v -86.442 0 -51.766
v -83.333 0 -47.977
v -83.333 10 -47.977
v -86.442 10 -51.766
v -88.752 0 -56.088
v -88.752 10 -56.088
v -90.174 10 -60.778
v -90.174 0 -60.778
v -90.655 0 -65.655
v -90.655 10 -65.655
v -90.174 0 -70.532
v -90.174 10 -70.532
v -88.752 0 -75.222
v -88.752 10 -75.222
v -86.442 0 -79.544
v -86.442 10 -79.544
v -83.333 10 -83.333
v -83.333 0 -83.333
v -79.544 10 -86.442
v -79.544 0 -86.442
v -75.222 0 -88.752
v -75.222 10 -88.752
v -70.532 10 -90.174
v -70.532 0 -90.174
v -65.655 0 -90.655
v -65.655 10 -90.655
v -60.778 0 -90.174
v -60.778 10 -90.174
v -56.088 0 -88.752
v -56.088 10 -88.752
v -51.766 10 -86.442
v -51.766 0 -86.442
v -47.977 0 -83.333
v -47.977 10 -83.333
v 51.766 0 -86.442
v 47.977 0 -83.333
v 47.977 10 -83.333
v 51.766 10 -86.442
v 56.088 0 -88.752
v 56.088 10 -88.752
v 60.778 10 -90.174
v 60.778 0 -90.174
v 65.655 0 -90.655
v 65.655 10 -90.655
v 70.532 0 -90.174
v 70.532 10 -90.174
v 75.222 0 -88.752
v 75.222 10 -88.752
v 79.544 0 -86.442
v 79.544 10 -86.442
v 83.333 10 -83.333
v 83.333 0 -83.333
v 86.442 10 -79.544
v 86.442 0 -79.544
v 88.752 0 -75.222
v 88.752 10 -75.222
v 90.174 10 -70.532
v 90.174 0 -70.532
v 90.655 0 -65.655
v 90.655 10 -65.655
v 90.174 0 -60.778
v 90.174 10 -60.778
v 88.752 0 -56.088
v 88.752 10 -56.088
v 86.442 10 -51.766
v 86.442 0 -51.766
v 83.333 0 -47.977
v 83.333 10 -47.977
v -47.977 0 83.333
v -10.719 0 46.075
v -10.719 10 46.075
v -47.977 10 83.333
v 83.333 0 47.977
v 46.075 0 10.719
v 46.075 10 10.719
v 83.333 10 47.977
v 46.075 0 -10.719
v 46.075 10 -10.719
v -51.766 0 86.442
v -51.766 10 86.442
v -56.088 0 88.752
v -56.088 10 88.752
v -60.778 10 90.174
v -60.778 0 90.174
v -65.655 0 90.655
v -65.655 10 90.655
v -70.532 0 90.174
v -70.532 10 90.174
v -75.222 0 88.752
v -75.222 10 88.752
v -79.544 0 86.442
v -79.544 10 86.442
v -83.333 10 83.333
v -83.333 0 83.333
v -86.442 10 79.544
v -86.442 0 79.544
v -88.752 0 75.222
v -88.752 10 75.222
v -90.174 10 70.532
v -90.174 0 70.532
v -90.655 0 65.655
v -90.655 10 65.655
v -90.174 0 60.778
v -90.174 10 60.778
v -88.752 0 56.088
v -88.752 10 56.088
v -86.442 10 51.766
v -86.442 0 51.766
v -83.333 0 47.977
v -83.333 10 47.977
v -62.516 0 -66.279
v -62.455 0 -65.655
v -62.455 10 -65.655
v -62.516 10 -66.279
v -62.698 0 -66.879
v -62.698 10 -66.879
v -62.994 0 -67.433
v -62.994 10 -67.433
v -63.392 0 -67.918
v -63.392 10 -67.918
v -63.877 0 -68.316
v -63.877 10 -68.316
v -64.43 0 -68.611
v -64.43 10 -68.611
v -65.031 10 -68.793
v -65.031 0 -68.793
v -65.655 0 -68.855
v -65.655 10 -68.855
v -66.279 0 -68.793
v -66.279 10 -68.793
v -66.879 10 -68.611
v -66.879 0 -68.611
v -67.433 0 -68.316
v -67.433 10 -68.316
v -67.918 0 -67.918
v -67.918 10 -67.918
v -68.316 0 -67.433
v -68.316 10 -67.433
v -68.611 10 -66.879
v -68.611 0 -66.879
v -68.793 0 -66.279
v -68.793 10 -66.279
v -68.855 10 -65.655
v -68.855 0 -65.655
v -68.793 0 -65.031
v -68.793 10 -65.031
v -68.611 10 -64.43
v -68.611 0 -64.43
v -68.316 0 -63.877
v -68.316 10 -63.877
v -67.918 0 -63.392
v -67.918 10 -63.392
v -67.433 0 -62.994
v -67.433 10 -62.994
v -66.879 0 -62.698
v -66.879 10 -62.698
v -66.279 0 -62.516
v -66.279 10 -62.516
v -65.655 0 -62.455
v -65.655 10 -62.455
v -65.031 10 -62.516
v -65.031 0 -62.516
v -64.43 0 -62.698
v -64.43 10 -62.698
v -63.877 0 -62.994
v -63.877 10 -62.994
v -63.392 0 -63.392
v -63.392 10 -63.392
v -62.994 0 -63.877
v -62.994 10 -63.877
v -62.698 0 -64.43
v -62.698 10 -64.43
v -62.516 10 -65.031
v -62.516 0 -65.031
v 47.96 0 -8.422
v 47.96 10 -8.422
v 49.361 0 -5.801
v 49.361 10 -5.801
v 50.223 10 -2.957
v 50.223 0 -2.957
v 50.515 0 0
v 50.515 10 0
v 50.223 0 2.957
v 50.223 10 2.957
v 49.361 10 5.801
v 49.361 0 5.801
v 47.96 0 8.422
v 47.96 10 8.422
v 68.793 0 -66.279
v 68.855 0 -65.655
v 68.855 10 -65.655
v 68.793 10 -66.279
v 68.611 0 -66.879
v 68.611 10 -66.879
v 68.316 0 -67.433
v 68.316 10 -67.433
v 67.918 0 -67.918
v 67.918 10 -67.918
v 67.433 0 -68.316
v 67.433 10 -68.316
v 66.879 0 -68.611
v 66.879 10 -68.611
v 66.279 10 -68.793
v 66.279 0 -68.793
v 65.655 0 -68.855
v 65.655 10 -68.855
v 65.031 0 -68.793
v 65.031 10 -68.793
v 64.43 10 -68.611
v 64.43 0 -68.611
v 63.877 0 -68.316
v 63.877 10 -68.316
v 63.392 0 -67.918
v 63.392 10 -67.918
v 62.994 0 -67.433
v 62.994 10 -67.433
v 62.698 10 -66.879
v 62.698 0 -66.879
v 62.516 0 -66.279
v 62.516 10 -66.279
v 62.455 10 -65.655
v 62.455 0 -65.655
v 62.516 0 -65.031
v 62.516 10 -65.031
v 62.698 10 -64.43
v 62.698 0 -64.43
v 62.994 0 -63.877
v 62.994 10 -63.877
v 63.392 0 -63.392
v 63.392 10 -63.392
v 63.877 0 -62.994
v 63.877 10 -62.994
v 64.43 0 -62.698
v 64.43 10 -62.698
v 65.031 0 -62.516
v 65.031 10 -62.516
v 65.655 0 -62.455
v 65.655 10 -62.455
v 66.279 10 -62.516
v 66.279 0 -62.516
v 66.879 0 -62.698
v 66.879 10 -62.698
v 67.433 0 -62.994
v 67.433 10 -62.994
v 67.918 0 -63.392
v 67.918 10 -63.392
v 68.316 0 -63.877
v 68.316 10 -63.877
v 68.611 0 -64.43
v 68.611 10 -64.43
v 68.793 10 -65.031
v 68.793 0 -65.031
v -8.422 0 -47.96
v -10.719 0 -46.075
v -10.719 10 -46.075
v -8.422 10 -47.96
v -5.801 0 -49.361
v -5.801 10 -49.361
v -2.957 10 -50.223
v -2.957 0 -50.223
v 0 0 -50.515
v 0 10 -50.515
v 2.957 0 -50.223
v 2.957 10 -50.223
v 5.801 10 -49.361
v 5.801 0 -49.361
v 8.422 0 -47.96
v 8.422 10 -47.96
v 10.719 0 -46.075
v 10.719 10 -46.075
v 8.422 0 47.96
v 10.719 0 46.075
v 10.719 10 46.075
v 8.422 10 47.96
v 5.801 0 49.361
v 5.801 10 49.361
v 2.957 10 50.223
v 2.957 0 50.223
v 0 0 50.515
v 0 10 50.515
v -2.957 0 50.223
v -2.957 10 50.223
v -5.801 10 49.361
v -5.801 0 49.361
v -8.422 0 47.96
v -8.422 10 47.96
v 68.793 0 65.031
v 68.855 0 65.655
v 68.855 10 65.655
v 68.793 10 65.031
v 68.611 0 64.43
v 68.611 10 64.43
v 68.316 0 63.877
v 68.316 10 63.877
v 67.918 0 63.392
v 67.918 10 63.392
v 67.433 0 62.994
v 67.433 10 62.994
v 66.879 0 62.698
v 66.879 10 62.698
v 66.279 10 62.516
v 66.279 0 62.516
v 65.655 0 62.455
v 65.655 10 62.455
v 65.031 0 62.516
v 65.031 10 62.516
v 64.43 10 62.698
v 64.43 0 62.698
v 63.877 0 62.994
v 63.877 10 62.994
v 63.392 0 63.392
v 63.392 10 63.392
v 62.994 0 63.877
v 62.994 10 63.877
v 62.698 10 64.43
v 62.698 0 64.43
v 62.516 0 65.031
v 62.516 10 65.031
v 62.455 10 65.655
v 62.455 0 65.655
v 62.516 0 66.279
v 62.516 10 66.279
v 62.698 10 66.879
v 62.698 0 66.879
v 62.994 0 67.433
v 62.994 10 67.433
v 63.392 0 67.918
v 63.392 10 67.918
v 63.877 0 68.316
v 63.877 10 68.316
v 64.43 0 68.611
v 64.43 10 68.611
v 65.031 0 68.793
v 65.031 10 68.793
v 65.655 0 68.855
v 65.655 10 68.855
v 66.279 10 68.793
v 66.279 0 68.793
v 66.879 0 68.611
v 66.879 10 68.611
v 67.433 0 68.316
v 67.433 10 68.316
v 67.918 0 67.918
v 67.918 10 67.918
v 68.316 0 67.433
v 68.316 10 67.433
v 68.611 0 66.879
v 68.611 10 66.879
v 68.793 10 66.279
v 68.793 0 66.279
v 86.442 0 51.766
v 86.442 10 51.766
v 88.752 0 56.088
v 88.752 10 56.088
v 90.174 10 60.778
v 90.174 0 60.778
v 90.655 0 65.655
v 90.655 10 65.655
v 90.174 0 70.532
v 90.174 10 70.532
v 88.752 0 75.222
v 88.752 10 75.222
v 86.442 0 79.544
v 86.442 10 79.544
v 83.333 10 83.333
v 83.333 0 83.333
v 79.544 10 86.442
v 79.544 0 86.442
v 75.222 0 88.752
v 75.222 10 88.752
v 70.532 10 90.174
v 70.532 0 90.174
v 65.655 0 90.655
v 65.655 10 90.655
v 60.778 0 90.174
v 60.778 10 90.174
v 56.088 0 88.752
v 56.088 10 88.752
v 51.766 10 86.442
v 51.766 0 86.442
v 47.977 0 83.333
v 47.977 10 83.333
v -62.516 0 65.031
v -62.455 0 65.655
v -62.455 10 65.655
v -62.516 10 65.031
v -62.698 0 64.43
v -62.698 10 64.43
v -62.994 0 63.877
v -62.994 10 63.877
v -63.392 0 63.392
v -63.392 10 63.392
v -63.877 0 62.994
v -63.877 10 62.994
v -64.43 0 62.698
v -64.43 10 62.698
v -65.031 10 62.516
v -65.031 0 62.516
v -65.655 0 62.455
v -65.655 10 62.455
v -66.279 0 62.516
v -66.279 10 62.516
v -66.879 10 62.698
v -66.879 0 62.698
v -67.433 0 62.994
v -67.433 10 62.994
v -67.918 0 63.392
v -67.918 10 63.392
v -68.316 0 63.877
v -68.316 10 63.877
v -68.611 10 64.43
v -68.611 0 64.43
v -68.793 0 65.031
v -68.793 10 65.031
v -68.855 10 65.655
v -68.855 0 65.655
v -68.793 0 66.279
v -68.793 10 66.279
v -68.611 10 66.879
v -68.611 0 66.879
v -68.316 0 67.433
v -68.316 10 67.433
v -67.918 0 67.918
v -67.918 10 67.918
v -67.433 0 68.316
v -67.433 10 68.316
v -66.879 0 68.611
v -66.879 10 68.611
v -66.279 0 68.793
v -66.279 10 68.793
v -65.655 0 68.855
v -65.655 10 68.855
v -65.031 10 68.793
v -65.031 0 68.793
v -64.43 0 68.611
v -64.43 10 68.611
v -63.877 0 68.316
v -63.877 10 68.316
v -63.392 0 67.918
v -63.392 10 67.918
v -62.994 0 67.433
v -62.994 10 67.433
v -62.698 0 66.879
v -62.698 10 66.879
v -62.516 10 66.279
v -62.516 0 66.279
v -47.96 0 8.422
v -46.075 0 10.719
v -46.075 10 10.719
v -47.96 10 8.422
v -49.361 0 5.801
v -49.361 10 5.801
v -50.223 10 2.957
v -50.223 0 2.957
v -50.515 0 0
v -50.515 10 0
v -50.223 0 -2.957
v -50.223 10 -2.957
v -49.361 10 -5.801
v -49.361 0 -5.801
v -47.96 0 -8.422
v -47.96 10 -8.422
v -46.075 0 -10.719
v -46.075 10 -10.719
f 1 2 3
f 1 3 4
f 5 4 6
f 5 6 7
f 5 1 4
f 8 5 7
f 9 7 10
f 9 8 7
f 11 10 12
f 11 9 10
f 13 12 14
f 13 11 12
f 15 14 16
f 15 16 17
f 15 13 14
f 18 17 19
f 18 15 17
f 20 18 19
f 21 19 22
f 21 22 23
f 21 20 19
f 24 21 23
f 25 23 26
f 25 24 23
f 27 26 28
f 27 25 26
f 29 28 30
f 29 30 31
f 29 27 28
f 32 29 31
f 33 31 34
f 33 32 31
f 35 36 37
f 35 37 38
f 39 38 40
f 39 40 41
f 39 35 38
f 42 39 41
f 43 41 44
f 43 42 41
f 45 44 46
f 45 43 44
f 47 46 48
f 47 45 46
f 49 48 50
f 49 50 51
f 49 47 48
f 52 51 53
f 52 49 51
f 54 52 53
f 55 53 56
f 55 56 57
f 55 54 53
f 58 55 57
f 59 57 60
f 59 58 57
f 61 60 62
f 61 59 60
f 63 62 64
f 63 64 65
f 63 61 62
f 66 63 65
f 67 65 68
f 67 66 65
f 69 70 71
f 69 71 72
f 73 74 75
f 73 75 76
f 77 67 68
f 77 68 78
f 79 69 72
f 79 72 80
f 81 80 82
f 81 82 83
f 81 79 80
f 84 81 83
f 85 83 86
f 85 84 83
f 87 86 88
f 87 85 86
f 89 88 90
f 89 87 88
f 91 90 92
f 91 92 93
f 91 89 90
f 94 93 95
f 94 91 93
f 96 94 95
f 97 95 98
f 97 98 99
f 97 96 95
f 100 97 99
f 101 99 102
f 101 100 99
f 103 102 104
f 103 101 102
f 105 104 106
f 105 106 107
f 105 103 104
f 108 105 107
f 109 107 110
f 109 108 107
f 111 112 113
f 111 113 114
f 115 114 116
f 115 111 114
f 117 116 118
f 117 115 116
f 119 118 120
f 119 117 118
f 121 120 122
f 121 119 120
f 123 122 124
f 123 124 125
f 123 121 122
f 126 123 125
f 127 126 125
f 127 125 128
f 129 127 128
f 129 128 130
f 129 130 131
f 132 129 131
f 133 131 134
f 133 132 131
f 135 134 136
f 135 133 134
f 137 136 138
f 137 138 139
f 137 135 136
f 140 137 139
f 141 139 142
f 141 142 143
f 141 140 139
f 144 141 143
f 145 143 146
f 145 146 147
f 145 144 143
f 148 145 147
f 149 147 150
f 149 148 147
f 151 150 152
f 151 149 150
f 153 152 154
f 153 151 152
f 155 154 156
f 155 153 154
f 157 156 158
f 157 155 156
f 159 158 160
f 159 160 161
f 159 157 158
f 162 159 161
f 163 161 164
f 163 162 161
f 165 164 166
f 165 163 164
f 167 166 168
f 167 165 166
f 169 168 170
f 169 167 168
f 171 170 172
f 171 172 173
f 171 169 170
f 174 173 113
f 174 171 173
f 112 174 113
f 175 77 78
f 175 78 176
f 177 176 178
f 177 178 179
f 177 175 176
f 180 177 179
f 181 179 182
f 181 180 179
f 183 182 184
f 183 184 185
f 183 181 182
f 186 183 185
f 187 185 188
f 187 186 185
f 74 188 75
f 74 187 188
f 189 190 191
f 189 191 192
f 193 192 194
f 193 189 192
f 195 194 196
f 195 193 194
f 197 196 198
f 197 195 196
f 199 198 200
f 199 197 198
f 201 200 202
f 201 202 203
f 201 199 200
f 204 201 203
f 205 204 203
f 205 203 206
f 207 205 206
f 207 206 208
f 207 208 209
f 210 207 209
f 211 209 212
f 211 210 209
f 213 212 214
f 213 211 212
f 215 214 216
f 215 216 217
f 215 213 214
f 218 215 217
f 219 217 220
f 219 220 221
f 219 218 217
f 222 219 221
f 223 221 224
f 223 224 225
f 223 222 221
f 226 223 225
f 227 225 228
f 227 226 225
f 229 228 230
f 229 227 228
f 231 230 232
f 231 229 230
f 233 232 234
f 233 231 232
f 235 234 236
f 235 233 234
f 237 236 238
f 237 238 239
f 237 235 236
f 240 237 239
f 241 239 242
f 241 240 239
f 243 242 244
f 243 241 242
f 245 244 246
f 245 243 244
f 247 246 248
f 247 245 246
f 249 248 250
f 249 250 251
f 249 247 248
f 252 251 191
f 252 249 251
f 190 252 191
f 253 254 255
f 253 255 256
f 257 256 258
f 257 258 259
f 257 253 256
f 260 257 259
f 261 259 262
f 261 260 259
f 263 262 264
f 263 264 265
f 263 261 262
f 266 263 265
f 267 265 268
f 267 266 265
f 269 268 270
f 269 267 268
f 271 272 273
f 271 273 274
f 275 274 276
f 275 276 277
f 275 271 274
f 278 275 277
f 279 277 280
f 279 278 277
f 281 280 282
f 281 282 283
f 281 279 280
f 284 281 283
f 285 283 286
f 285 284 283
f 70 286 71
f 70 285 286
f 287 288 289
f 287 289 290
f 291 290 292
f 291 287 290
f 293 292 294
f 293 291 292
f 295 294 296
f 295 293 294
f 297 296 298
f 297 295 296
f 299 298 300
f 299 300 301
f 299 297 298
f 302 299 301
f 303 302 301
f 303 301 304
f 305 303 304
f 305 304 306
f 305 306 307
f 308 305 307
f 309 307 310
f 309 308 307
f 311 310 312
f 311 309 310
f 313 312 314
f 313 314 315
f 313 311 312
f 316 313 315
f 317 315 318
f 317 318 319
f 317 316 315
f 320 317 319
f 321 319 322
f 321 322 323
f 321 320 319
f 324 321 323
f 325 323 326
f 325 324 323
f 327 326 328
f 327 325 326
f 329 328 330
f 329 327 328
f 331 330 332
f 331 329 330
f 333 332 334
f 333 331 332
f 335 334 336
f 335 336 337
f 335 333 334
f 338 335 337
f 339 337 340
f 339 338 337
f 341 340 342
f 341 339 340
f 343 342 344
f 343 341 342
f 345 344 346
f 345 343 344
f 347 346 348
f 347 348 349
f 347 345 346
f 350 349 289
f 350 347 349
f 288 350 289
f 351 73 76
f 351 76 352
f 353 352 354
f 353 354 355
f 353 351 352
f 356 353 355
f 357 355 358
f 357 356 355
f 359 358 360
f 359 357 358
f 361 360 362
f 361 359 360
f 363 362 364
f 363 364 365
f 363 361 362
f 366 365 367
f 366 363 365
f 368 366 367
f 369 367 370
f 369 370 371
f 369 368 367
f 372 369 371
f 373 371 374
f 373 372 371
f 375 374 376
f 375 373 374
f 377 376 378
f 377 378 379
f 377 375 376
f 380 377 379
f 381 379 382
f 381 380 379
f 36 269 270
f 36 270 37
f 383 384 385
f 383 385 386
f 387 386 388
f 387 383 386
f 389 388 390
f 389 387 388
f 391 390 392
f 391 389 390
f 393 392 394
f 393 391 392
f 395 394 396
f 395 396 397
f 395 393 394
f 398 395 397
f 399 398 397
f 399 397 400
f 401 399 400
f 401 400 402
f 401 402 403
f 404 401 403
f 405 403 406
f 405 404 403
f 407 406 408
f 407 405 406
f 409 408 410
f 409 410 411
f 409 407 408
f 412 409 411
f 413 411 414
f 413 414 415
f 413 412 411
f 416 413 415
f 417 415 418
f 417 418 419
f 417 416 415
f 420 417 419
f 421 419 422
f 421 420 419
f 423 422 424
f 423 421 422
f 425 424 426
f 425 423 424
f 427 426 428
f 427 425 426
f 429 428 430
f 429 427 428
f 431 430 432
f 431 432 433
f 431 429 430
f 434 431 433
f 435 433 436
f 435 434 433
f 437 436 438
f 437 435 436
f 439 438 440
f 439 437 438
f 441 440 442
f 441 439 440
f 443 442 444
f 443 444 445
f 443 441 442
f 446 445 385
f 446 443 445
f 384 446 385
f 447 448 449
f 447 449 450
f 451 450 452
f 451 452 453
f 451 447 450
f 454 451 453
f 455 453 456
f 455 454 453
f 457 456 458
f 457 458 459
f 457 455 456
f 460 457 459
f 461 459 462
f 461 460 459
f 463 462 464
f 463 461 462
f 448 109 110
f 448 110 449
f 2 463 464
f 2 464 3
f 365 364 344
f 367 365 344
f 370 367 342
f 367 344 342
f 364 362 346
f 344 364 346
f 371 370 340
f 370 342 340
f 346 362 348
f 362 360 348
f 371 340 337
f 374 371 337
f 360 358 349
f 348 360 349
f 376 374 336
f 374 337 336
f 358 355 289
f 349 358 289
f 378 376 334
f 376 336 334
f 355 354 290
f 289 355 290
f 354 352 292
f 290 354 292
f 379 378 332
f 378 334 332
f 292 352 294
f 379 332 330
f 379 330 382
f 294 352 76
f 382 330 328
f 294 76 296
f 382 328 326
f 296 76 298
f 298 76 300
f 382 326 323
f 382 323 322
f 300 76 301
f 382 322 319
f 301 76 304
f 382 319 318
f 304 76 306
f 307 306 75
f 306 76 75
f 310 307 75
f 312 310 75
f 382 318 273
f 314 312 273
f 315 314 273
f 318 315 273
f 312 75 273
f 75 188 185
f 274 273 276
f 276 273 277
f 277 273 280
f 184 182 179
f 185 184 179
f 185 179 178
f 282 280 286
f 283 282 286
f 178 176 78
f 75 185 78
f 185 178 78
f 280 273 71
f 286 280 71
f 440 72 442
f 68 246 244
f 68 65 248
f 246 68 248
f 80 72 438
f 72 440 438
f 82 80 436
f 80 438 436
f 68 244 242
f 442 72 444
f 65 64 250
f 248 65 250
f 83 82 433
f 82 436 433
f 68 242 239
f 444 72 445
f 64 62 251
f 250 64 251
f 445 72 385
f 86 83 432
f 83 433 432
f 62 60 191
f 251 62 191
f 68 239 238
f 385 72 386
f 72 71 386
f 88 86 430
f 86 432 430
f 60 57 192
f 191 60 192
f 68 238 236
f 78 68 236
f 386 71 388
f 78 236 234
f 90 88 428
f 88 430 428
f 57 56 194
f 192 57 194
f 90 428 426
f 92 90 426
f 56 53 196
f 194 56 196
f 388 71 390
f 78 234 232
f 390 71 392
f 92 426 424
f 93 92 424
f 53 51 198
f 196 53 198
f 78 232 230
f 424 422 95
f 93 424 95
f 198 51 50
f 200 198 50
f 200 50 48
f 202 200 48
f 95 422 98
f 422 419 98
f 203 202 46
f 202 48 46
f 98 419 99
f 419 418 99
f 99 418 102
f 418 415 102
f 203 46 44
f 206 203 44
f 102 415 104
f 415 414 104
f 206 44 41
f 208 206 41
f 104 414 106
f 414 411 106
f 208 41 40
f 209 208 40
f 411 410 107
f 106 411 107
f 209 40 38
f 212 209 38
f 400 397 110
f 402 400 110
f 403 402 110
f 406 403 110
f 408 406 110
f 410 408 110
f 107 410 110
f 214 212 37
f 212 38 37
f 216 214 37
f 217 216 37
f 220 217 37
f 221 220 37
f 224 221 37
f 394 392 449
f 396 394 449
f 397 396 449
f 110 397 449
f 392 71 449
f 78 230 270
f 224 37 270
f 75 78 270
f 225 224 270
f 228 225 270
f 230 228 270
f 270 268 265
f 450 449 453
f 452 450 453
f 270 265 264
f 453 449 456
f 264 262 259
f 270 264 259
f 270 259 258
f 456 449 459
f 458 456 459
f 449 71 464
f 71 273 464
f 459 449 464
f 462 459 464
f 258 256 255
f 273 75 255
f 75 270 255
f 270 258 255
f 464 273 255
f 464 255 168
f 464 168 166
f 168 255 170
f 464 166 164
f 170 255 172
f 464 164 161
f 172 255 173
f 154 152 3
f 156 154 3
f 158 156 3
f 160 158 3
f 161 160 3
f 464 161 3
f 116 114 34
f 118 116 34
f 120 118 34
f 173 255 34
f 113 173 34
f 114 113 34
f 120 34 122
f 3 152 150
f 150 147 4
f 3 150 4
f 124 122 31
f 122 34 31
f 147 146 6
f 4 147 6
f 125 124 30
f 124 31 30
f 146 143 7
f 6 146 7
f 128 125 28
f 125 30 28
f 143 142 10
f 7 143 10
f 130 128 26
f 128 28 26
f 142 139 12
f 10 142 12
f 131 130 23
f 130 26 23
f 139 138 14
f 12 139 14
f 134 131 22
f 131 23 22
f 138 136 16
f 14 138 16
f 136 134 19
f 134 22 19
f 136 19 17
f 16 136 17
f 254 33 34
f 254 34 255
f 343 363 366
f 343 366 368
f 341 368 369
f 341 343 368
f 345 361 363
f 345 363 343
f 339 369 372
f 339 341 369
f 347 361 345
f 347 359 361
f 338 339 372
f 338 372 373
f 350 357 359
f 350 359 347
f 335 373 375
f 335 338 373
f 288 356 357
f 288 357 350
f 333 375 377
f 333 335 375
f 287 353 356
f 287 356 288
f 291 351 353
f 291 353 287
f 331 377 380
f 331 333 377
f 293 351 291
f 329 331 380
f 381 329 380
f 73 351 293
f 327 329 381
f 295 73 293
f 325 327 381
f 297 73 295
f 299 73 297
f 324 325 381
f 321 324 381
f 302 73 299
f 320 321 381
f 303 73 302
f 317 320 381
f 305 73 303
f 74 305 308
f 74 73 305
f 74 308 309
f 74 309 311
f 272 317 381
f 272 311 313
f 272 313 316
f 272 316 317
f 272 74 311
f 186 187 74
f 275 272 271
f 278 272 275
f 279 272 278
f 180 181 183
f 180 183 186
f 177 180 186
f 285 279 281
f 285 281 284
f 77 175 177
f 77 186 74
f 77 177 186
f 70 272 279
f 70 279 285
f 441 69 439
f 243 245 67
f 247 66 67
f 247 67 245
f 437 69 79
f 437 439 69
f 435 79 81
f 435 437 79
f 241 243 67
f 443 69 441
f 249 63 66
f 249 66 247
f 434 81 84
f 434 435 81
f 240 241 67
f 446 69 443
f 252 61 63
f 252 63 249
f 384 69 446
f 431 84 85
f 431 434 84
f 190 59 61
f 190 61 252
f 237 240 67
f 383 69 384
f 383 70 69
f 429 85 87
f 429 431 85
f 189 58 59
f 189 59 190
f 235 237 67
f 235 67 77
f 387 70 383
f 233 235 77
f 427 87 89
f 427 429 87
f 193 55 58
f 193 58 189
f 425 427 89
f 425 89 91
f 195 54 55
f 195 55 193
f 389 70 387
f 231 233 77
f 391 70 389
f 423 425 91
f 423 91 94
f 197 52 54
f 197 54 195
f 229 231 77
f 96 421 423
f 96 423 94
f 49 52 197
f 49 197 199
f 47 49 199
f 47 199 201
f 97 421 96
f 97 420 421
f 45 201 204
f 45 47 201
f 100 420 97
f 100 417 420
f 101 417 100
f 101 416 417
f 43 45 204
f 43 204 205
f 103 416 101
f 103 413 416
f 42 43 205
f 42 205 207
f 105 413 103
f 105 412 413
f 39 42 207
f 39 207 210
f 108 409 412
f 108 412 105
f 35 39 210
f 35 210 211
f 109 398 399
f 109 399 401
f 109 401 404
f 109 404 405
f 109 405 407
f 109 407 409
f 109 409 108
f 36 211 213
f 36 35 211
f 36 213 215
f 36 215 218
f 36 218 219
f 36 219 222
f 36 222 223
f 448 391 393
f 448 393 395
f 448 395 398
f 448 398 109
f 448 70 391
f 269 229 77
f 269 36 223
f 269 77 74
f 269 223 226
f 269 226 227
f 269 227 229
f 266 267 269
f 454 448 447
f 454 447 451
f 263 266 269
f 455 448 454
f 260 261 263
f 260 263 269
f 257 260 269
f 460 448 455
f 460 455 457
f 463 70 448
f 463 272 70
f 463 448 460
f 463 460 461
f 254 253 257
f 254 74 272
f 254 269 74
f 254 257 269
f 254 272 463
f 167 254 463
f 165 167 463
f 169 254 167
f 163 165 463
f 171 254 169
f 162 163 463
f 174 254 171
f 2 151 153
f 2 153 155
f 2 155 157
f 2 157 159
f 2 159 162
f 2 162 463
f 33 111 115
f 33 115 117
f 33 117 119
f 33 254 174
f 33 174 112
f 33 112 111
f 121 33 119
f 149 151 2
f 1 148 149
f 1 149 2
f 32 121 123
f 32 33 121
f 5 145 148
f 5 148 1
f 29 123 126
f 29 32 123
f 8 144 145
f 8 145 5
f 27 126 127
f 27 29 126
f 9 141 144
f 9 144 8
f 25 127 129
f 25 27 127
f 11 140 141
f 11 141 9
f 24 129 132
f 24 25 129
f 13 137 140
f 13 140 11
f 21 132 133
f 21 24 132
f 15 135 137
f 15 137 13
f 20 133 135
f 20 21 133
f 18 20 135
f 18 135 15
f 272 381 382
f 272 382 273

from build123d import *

# Parameters (mm, degrees)
SKETCH1_R           = 3.2
BOSS_EXTRUDE1_DEPTH = 10


with BuildPart() as part:
    # Sketch1 → Boss-Extrude1 (new body)
    with BuildSketch(Plane(origin=(0, 0, 0), x_dir=(1, 0, 0), z_dir=(0, 1, 0))):
        with BuildLine():
            Line((-47.977195104, 83.332534163), (-10.719183363, 46.074522422))
            ThreePointArc((-10.719183363, 46.074522422), (0, 50.514553548), (10.719183363, 46.074522422))
            Line((10.719183363, 46.074522422), (47.977195104, 83.332534163))
            ThreePointArc((47.977195104, 83.332534163), (83.332534163, 83.332534163), (83.332534163, 47.977195104))
            Line((83.332534163, 47.977195104), (46.074522422, 10.719183363))
            ThreePointArc((46.074522422, 10.719183363), (50.514553548, 0), (46.074522422, -10.719183363))
            Line((46.074522422, -10.719183363), (83.332534163, -47.977195104))
            ThreePointArc((83.332534163, -47.977195104), (83.332534163, -83.332534163), (47.977195104, -83.332534163))
            Line((47.977195104, -83.332534163), (10.719183363, -46.074522422))
            ThreePointArc((10.719183363, -46.074522422), (0, -50.514553548), (-10.719183363, -46.074522422))
            Line((-10.719183363, -46.074522422), (-47.977195104, -83.332534163))
            ThreePointArc((-47.977195104, -83.332534163), (-83.332534163, -83.332534163), (-83.332534163, -47.977195104))
            Line((-83.332534163, -47.977195104), (-46.074522422, -10.719183363))
            ThreePointArc((-46.074522422, -10.719183363), (-50.514553548, 0), (-46.074522422, 10.719183363))
            Line((-46.074522422, 10.719183363), (-83.332534163, 47.977195104))
            ThreePointArc((-83.332534163, 47.977195104), (-83.332534163, 83.332534163), (-47.977195104, 83.332534163))
        make_face()
        with Locations((-65.654864633, 65.654864633)):
            Circle(SKETCH1_R, mode=Mode.SUBTRACT)
        with Locations((65.654864633, -65.654864633)):
            Circle(SKETCH1_R, mode=Mode.SUBTRACT)
        with Locations((65.654864633, 65.654864633)):
            Circle(SKETCH1_R, mode=Mode.SUBTRACT)
        with Locations((-65.654864633, -65.654864633)):
            Circle(SKETCH1_R, mode=Mode.SUBTRACT)
    extrude(amount=BOSS_EXTRUDE1_DEPTH)


solid = part.part
